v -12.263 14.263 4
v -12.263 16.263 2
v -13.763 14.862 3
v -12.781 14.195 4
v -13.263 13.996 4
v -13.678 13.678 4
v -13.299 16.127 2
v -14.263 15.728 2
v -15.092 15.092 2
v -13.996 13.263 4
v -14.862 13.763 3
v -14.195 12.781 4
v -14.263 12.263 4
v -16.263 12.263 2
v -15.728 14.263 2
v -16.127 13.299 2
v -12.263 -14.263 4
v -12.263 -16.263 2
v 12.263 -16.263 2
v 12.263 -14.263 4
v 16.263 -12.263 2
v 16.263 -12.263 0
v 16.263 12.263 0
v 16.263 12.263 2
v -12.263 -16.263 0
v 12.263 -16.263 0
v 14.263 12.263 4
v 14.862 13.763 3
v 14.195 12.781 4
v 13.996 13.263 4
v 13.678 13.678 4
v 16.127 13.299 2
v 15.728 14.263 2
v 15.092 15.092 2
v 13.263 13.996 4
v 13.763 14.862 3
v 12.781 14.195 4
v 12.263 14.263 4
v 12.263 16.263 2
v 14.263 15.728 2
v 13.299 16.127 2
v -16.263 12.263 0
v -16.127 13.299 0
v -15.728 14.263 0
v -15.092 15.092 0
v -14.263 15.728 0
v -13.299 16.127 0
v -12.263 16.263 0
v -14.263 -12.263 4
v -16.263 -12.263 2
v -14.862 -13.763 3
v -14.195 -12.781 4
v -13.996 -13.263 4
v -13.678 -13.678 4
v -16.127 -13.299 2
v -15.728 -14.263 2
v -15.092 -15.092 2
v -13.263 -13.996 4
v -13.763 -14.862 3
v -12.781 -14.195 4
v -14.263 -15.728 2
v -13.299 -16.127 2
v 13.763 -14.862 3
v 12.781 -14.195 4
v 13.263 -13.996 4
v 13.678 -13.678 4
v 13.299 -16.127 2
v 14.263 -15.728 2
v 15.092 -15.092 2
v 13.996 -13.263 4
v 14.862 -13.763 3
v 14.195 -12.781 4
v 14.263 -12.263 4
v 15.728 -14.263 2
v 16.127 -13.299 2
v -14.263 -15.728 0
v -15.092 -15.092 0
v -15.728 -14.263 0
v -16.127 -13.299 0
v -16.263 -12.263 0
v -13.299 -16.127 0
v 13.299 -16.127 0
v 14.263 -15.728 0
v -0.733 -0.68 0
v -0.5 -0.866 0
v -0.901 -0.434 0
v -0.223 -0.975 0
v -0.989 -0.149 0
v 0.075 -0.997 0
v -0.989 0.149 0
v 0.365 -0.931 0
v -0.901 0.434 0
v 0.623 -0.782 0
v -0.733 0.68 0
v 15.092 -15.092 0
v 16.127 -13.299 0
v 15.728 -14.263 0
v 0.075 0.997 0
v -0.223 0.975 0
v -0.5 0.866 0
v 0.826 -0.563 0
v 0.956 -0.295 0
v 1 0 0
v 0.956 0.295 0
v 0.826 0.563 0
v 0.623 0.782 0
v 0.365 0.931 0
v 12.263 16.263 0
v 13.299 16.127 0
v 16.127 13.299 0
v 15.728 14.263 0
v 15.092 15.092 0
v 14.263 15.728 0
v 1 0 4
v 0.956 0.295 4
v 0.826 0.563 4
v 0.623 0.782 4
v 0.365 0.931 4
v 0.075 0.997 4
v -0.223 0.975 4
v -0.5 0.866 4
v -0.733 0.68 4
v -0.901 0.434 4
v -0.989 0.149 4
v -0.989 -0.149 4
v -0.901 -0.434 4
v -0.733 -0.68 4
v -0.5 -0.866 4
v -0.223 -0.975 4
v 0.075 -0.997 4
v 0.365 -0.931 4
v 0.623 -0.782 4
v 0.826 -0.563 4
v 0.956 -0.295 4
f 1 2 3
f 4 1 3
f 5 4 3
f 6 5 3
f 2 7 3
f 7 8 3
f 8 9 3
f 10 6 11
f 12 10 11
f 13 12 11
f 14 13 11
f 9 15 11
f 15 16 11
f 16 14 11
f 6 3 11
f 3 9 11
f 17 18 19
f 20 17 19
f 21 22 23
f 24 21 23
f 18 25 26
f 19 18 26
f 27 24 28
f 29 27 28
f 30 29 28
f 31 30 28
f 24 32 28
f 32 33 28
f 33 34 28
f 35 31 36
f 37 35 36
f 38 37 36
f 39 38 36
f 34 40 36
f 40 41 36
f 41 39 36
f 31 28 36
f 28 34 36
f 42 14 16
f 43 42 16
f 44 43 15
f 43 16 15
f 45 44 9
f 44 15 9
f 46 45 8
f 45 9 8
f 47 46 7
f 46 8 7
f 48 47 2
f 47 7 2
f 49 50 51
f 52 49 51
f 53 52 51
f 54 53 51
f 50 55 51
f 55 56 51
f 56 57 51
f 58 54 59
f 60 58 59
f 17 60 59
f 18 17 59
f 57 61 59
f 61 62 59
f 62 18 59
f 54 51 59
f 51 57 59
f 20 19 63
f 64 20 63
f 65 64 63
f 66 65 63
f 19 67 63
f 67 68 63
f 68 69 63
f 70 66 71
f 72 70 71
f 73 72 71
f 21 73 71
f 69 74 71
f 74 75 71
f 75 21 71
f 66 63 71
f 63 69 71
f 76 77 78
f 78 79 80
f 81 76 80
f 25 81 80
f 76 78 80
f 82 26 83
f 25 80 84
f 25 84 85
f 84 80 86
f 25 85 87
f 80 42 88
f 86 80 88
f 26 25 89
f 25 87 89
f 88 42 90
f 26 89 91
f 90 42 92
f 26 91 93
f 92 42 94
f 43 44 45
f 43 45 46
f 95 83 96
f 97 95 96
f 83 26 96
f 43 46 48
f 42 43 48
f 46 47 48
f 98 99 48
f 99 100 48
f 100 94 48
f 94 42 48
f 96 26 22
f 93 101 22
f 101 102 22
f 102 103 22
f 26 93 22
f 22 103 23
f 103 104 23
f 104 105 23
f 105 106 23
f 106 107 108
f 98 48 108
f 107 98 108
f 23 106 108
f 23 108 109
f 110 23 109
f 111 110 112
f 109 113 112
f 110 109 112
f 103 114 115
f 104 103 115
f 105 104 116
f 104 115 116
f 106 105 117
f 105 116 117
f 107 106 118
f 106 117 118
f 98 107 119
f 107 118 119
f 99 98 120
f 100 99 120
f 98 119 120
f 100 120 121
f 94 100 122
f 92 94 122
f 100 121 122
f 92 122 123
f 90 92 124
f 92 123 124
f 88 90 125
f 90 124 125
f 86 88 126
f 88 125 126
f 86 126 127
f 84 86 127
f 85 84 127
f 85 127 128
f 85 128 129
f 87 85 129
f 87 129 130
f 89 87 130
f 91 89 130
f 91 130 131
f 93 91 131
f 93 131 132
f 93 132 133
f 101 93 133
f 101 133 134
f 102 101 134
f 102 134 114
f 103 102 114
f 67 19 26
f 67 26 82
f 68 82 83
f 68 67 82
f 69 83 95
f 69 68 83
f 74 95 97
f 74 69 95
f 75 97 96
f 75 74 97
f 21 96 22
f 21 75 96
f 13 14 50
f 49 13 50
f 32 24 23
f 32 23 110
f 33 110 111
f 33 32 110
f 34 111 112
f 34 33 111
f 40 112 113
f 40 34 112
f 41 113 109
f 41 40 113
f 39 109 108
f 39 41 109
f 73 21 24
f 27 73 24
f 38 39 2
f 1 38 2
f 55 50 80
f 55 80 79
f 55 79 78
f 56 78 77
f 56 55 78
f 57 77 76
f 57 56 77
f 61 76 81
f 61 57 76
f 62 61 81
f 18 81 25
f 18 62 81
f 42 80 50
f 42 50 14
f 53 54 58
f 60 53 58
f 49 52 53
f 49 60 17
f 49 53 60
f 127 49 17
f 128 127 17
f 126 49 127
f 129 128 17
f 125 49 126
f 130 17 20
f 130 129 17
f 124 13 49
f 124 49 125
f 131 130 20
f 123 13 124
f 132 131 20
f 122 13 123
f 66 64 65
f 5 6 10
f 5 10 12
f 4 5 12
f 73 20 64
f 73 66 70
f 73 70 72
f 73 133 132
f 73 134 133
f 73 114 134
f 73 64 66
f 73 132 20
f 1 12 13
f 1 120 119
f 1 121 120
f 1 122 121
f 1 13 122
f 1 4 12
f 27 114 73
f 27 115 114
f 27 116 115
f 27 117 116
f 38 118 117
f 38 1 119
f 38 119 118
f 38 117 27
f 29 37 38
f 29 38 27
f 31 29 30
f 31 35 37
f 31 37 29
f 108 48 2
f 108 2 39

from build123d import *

# Parameters (mm, degrees)
SKETCH1_W           = 32.526911934
SKETCH1_H           = 32.526911934
BOSS_EXTRUDE1_DEPTH = 4
FILLET1_R           = 4
CHAMFER1_SIZE       = 2
SKETCH2_R           = 1
CUT_EXTRUDE1_DEPTH  = 24.34523506


with BuildPart() as part:
    # Sketch1 → Boss-Extrude1 (new body)
    with BuildSketch(Plane.XY):
        Rectangle(SKETCH1_W, SKETCH1_H)
    extrude(amount=BOSS_EXTRUDE1_DEPTH)

    # Fillet1
    fillet1_edges = [part.edges().sort_by_distance(p)[0] for p in [
        (-16.263455967, 16.263455967, 2),
        (16.263455967, 16.263455967, 2),
        (16.263455967, -16.263455967, 2),
        (-16.263455967, -16.263455967, 2),
    ]]
    fillet(fillet1_edges, radius=FILLET1_R)

    # Chamfer1
    chamfer1_edges = [part.edges().sort_by_distance(p)[0] for p in [
        (0, -16.263455967, 4),
        (-16.263455967, 0, 4),
        (16.263455967, 0, 4),
        (0, 16.263455967, 4),
        (-15.091883092, 15.091883092, 4),
        (15.091883092, 15.091883092, 4),
        (15.091883092, -15.091883092, 4),
        (-15.091883092, -15.091883092, 4),
    ]]
    chamfer(chamfer1_edges, length=CHAMFER1_SIZE)

    # Sketch2 → Cut-Extrude1 (cut, through all)
    with BuildSketch(Plane.XY.offset(4)):
        Circle(SKETCH2_R)
    extrude(amount=-CUT_EXTRUDE1_DEPTH, mode=Mode.SUBTRACT)


solid = part.part
